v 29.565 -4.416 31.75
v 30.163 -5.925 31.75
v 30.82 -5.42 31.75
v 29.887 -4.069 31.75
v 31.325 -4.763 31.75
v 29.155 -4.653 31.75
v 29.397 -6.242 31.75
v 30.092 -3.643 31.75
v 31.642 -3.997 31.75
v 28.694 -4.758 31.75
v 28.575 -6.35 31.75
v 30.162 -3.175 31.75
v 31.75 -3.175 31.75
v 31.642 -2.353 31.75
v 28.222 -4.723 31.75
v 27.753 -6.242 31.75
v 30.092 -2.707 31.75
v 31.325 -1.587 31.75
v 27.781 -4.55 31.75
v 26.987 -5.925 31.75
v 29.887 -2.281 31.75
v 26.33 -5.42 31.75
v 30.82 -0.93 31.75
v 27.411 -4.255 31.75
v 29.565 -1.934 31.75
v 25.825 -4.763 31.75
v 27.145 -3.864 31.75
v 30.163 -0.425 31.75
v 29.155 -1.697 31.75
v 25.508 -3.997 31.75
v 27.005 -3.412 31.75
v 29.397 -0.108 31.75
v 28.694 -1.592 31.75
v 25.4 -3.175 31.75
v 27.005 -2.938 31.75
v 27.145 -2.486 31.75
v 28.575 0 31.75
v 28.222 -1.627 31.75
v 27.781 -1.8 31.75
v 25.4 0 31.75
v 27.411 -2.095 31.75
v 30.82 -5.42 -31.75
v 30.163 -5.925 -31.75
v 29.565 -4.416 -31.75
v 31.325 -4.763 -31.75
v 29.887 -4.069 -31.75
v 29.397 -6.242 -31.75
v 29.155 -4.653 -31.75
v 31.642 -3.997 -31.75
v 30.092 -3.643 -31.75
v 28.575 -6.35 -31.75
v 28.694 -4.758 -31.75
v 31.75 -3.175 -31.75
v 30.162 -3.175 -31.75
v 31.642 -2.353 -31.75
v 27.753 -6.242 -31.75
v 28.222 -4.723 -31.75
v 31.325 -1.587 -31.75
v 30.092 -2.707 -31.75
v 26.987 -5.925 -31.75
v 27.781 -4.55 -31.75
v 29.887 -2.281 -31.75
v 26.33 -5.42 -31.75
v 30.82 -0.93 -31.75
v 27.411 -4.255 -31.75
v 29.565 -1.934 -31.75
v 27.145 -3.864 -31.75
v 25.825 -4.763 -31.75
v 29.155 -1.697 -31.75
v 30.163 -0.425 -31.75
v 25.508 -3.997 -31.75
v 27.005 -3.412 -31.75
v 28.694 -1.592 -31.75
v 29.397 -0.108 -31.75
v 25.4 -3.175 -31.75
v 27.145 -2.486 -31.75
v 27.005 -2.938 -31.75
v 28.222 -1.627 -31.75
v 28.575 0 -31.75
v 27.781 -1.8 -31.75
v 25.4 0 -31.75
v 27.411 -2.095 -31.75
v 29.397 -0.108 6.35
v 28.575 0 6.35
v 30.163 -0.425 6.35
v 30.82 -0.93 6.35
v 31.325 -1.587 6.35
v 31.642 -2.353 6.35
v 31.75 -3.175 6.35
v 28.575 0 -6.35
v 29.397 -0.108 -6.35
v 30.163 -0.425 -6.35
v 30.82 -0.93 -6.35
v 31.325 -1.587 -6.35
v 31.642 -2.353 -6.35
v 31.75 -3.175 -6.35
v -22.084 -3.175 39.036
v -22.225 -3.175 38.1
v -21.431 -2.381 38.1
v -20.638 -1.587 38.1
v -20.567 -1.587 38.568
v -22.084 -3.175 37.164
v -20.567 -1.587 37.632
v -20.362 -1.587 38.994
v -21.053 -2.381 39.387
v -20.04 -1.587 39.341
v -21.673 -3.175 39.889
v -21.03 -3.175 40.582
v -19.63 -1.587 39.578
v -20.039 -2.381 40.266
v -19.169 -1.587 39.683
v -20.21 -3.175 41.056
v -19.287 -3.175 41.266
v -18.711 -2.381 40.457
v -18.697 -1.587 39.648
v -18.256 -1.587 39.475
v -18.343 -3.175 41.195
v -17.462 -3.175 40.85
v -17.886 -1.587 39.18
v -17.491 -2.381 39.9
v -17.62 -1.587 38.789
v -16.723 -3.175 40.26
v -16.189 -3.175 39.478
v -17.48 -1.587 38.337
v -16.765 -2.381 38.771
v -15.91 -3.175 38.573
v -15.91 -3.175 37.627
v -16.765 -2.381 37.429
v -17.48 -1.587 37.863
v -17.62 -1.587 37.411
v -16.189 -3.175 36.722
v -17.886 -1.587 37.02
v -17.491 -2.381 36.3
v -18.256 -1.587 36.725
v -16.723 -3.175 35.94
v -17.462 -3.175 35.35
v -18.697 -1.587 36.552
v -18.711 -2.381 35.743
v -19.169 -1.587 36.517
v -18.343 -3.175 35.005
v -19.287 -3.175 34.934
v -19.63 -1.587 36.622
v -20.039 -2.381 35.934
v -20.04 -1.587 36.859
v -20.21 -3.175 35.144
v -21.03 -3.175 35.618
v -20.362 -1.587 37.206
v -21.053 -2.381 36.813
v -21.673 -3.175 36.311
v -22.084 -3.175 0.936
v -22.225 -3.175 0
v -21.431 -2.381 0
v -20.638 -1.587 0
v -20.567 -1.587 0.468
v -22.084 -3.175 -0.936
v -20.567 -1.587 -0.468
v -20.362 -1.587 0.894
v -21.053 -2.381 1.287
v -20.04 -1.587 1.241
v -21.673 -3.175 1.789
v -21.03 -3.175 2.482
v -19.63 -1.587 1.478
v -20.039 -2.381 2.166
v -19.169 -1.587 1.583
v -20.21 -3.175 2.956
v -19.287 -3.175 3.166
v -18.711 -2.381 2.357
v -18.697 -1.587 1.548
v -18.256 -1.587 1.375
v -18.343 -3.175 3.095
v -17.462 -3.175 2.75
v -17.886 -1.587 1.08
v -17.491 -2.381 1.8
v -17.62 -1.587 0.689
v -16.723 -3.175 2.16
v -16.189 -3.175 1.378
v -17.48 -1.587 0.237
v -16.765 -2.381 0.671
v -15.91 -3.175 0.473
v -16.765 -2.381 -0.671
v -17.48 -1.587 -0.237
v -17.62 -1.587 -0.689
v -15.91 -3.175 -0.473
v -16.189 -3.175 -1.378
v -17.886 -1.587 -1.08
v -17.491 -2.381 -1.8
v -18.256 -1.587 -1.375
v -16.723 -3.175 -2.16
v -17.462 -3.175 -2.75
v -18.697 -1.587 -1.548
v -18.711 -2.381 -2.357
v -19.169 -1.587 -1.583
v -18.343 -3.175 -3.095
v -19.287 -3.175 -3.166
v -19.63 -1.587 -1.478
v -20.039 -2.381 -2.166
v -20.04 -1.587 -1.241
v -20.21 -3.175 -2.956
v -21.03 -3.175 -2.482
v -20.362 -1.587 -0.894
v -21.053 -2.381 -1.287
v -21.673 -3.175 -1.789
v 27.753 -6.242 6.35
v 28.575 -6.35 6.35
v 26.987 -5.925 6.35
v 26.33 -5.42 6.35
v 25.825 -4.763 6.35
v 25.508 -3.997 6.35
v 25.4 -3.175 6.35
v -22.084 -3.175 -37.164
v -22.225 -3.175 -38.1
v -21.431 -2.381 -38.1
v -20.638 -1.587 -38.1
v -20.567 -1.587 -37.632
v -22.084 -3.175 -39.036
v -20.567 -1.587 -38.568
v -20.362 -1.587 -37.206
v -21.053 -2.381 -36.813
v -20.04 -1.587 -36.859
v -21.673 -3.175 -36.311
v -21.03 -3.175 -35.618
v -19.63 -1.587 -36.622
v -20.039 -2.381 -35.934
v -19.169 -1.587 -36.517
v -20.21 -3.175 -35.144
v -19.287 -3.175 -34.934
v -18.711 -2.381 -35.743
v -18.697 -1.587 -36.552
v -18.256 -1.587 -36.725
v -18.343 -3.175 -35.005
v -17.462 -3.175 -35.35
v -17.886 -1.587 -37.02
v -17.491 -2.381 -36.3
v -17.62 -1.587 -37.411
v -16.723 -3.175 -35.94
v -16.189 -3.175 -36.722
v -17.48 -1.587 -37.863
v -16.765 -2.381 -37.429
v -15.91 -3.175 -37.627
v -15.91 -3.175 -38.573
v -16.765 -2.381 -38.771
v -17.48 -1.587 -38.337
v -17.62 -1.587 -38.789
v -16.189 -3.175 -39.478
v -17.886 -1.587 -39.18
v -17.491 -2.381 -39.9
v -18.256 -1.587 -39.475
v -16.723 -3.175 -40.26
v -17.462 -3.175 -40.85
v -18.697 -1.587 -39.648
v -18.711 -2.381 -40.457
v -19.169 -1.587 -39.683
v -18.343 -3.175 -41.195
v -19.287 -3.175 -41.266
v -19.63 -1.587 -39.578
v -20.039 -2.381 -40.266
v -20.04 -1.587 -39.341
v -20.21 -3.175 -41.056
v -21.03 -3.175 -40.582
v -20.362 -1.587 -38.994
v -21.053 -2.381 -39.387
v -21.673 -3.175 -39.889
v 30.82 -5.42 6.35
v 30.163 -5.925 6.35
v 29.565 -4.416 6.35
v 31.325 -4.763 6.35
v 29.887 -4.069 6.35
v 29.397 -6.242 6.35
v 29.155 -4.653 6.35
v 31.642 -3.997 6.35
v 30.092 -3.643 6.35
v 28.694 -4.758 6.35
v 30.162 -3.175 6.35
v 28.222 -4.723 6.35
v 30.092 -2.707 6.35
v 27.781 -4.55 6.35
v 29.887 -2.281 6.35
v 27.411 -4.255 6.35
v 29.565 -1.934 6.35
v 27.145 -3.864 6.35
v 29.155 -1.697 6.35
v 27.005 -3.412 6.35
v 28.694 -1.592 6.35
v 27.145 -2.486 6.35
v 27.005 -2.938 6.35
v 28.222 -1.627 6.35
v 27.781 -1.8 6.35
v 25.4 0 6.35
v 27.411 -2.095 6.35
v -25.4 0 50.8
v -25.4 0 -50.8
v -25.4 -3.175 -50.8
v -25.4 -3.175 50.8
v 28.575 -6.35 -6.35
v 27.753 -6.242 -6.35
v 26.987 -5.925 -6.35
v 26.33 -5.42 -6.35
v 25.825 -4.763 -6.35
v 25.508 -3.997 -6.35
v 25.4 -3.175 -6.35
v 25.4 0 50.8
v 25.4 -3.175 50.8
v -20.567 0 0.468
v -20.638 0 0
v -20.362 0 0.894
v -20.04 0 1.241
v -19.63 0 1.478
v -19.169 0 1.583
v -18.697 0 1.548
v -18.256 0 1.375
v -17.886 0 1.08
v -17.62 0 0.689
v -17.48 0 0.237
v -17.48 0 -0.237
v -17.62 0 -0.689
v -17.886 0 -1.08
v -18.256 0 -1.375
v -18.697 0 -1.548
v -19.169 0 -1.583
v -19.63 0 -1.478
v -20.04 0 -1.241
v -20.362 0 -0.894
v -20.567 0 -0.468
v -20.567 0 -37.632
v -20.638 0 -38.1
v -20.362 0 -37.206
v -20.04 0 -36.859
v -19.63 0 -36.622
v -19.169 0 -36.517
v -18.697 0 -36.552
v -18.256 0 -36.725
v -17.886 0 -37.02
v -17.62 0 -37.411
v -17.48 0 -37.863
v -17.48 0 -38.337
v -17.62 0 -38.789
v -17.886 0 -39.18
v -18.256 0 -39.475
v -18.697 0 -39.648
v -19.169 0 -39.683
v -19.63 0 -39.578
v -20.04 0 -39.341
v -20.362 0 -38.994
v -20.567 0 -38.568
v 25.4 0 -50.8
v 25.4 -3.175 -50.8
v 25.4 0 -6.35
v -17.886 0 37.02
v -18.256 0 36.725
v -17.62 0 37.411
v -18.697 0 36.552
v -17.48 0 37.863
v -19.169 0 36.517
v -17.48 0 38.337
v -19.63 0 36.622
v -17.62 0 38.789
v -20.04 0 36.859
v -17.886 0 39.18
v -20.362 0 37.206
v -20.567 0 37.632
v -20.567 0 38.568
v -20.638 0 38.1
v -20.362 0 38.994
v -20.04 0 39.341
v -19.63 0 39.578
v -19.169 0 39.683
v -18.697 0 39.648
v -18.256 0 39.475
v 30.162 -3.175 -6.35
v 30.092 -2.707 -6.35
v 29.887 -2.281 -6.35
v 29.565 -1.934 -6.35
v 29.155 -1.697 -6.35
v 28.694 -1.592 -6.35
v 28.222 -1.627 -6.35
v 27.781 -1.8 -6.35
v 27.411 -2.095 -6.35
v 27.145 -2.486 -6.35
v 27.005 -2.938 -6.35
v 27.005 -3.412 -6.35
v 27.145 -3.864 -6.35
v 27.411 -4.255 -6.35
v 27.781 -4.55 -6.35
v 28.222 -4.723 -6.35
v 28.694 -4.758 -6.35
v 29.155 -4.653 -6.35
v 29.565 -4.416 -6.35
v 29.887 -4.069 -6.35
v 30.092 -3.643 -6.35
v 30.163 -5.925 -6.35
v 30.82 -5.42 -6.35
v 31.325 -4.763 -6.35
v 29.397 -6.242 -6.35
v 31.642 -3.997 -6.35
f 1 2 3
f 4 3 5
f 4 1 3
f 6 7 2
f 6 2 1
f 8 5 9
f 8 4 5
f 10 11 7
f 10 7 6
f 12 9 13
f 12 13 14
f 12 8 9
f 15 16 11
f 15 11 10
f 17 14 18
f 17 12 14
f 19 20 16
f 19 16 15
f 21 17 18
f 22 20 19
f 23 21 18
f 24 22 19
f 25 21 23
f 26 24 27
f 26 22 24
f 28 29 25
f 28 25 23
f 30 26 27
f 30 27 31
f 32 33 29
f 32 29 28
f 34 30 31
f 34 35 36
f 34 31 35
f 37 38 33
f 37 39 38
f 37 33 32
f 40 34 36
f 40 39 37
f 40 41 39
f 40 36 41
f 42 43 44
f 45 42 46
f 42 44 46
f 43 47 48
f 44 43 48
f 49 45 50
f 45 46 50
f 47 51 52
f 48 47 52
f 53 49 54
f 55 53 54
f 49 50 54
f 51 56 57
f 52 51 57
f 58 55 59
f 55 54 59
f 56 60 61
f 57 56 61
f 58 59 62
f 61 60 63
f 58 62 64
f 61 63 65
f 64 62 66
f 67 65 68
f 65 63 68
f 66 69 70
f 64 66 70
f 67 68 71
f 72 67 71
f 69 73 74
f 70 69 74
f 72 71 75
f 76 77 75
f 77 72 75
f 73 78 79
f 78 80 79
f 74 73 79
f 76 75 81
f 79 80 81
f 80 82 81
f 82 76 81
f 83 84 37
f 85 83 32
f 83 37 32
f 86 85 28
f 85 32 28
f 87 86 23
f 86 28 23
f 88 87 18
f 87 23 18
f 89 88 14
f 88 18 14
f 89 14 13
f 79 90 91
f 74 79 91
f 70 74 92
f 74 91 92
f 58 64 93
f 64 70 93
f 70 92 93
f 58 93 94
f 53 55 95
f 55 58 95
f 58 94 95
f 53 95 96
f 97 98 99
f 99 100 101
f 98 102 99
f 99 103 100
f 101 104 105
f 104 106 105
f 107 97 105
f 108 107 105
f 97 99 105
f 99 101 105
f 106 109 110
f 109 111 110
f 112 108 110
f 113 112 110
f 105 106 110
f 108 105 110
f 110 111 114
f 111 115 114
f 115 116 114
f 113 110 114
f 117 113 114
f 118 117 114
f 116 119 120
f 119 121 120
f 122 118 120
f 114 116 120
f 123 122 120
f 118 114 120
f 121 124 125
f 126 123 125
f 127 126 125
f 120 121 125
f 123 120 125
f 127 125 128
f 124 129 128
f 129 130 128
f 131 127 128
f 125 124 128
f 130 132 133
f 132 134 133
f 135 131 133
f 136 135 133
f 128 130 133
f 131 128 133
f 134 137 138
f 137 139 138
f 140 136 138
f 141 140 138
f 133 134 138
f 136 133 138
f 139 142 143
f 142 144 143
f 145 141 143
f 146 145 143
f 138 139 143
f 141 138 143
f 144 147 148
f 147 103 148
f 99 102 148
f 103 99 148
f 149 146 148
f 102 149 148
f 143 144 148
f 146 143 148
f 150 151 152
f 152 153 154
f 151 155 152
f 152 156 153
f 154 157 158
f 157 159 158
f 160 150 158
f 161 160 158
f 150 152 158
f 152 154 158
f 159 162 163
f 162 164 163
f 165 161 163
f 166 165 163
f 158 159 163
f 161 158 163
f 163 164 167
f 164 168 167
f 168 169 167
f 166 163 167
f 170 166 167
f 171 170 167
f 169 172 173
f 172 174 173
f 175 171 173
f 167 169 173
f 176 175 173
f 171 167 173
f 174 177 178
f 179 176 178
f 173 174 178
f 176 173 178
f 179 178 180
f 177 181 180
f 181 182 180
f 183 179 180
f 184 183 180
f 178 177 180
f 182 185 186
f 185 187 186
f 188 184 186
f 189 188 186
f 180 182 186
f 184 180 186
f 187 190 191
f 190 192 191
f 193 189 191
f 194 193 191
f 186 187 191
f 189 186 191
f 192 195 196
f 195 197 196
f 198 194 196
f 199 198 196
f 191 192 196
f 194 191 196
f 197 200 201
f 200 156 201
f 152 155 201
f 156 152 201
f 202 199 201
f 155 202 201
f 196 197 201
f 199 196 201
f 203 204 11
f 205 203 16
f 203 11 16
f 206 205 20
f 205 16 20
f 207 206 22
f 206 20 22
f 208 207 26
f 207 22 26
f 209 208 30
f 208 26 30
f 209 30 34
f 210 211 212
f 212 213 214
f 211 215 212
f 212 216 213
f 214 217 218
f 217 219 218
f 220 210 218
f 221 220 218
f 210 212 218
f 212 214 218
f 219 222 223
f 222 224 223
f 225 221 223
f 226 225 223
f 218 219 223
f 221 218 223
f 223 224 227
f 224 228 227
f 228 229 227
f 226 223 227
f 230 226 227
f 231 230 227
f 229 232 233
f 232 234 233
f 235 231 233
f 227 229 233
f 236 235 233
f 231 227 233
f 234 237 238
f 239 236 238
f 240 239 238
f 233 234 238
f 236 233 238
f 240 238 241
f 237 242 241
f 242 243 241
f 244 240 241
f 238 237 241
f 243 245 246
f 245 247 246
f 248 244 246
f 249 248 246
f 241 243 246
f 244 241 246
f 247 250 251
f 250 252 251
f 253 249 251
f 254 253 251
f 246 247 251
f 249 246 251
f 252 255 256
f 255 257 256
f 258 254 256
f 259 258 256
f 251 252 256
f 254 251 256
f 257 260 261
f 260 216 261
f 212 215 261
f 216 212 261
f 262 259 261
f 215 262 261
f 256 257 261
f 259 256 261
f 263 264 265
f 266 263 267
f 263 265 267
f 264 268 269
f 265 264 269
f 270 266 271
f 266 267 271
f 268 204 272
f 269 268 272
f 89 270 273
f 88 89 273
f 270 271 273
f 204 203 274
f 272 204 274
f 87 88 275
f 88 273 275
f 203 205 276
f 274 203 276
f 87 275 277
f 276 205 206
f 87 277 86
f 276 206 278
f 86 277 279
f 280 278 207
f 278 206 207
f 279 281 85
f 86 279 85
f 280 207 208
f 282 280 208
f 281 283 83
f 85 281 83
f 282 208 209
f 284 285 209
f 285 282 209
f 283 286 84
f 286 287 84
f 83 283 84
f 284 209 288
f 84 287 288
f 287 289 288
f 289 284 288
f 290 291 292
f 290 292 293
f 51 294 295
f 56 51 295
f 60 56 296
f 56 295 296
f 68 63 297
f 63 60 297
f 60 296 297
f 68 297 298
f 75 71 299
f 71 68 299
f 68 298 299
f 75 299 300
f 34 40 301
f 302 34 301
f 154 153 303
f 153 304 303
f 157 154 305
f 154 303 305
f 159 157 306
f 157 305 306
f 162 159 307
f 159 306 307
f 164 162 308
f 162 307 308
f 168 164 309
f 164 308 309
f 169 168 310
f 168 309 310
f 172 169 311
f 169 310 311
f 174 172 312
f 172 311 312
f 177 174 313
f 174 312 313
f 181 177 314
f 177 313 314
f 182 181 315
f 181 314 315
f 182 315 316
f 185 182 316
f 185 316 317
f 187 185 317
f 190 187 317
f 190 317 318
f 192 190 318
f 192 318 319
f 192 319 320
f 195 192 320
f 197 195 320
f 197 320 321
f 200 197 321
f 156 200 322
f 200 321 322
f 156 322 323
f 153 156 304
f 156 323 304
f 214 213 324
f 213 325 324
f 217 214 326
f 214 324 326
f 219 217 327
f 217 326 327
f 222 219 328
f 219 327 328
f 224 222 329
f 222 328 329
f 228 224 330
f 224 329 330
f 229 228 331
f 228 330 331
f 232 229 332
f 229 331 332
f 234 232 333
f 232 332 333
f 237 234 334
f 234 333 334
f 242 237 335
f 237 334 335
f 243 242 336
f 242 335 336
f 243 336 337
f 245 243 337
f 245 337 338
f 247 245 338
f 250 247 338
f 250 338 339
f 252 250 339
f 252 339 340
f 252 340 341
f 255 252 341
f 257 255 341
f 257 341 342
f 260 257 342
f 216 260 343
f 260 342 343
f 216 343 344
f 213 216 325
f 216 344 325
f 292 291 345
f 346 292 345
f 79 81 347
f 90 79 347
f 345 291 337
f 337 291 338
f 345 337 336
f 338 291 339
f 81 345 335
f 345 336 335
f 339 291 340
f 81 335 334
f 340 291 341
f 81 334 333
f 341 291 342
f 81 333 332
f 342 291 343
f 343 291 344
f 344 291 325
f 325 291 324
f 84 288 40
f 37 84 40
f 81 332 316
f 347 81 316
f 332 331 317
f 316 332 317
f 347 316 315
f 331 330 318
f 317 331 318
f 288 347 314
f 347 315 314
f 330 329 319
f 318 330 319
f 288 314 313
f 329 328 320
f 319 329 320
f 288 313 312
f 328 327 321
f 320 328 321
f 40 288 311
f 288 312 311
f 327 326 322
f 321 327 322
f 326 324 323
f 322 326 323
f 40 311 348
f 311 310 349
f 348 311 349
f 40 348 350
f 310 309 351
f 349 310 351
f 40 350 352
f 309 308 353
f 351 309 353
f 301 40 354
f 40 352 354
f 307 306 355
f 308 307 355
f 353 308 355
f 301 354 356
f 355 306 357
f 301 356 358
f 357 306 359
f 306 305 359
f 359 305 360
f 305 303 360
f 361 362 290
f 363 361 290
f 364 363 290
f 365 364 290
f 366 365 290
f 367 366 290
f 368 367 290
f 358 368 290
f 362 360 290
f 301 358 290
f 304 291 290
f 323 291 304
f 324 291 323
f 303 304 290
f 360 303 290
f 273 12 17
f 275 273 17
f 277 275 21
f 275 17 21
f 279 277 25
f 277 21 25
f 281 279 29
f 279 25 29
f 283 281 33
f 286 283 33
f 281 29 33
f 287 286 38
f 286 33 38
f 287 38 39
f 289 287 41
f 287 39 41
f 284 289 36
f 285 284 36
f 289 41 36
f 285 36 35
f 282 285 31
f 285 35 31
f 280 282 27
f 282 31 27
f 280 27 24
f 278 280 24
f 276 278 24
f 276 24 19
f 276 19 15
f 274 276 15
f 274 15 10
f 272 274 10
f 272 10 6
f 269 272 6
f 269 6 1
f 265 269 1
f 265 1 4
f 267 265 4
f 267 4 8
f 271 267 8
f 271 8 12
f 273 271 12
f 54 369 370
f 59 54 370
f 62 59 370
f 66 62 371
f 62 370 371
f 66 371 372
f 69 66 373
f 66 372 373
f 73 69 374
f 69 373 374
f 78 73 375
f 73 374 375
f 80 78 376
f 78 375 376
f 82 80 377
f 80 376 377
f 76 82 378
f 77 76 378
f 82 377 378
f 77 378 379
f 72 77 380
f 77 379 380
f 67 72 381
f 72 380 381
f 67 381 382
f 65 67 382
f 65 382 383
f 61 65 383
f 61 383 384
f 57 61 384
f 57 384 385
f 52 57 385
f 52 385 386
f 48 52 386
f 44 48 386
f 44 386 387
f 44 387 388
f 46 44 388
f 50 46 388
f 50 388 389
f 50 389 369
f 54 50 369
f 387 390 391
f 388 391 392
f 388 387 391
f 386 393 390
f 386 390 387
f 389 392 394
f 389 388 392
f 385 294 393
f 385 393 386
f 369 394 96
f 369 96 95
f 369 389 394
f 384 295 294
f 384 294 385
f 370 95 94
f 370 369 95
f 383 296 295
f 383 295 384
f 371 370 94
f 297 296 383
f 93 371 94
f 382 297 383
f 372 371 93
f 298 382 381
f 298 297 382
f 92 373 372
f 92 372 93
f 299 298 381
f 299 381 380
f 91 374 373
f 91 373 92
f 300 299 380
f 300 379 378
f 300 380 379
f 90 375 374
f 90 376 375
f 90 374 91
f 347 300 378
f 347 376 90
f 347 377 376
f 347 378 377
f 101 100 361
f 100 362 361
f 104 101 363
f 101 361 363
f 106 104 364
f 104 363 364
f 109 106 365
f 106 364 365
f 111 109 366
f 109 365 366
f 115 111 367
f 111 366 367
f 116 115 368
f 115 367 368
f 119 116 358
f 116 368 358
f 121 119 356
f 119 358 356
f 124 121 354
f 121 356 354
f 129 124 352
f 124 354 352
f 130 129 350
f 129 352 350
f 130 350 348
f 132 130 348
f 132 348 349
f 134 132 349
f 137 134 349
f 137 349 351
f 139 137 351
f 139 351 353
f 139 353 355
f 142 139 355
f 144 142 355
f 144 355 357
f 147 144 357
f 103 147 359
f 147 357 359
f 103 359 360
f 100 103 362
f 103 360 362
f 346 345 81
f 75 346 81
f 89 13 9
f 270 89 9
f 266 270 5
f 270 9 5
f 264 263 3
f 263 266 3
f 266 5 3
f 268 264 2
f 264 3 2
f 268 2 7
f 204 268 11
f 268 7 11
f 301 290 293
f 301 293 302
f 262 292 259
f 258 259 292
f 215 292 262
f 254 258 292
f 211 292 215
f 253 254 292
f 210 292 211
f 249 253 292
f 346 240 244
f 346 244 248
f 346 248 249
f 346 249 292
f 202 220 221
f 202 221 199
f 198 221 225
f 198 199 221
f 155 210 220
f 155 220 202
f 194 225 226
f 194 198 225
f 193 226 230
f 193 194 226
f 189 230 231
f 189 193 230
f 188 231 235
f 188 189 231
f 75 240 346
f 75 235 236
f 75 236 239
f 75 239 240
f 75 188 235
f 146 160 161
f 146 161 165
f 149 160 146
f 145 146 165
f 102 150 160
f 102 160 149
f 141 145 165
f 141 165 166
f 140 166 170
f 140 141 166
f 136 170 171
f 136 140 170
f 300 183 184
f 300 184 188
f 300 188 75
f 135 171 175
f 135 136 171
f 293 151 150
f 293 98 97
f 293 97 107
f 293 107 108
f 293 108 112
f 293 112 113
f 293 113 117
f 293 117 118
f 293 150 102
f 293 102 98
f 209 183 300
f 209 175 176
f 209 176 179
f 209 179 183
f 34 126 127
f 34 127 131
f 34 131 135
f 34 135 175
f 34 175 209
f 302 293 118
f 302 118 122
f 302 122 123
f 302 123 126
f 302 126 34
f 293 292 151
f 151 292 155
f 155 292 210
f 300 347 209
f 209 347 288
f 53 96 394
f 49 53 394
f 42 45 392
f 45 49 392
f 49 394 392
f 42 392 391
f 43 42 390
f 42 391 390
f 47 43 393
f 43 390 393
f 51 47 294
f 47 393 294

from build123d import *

# Parameters (mm, degrees)
F0_W           = 50.8
F0_H           = 101.6
F1_DEPTH       = 3.175
F2_W           = 6.35
F2_H           = 25.4
F3_DEPTH       = 6.35
F5_DEPTH       = 82.551
F6_R           = 1.5875
F7_DEPTH       = 82.551
F9_D           = 3.175
F9_CSINK_D     = 6.35
F9_CSINK_ANGLE = 90


with BuildPart() as f1:
    # F0 (on Front) → F1 (new body)
    with BuildSketch(Plane.XZ):
        Rectangle(F0_W, F0_H)
    extrude(amount=F1_DEPTH)

    # F2 (on face) → F3 (join)
    with BuildSketch(Plane.YZ.offset(25.4)):
        with Locations((-3.175, 19.05)):
            Rectangle(F2_W, F2_H)
        with Locations((-3.175, -19.05)):
            Rectangle(F2_W, F2_H)
    extrude(amount=F3_DEPTH)

    # F4 (on face) → F5 (cut, through all)
    with BuildSketch(Plane.XY.offset(31.75)):
        with BuildLine():
            Line((31.75, -6.35), (31.75, -3.175))
            ThreePointArc((31.75, -3.175), (30.8200640303, -5.4200640303), (28.575, -6.35))
            Line((28.575, -6.35), (31.75, -6.35))
        make_face()
        with BuildLine():
            ThreePointArc((28.575, 0), (30.8200640303, -0.9299359697), (31.75, -3.175))
            Line((31.75, -3.175), (31.75, 0))
            Line((31.75, 0), (28.575, 0))
        make_face()
        with BuildLine():
            Line((25.4, -6.35), (28.575, -6.35))
            ThreePointArc((28.575, -6.35), (26.3299359697, -5.4200640303), (25.4, -3.175))
            Line((25.4, -3.175), (25.4, -6.35))
        make_face()
    extrude(amount=-F5_DEPTH, mode=Mode.SUBTRACT)

    # F6 (on face) → F7 (cut, through all)
    with BuildSketch(Plane.XY.offset(31.75)):
        with Locations((28.575, -3.175)):
            Circle(F6_R)
    extrude(amount=-F7_DEPTH, mode=Mode.SUBTRACT)

    # F9 (through all)
    with Locations(Plane.XZ.offset(3.175)):
        with Locations((-19.05, 38.1), (-19.05, 0), (-19.05, -38.1)):
            CounterSinkHole(F9_D / 2, F9_CSINK_D / 2, counter_sink_angle=F9_CSINK_ANGLE)


solid = f1.part
